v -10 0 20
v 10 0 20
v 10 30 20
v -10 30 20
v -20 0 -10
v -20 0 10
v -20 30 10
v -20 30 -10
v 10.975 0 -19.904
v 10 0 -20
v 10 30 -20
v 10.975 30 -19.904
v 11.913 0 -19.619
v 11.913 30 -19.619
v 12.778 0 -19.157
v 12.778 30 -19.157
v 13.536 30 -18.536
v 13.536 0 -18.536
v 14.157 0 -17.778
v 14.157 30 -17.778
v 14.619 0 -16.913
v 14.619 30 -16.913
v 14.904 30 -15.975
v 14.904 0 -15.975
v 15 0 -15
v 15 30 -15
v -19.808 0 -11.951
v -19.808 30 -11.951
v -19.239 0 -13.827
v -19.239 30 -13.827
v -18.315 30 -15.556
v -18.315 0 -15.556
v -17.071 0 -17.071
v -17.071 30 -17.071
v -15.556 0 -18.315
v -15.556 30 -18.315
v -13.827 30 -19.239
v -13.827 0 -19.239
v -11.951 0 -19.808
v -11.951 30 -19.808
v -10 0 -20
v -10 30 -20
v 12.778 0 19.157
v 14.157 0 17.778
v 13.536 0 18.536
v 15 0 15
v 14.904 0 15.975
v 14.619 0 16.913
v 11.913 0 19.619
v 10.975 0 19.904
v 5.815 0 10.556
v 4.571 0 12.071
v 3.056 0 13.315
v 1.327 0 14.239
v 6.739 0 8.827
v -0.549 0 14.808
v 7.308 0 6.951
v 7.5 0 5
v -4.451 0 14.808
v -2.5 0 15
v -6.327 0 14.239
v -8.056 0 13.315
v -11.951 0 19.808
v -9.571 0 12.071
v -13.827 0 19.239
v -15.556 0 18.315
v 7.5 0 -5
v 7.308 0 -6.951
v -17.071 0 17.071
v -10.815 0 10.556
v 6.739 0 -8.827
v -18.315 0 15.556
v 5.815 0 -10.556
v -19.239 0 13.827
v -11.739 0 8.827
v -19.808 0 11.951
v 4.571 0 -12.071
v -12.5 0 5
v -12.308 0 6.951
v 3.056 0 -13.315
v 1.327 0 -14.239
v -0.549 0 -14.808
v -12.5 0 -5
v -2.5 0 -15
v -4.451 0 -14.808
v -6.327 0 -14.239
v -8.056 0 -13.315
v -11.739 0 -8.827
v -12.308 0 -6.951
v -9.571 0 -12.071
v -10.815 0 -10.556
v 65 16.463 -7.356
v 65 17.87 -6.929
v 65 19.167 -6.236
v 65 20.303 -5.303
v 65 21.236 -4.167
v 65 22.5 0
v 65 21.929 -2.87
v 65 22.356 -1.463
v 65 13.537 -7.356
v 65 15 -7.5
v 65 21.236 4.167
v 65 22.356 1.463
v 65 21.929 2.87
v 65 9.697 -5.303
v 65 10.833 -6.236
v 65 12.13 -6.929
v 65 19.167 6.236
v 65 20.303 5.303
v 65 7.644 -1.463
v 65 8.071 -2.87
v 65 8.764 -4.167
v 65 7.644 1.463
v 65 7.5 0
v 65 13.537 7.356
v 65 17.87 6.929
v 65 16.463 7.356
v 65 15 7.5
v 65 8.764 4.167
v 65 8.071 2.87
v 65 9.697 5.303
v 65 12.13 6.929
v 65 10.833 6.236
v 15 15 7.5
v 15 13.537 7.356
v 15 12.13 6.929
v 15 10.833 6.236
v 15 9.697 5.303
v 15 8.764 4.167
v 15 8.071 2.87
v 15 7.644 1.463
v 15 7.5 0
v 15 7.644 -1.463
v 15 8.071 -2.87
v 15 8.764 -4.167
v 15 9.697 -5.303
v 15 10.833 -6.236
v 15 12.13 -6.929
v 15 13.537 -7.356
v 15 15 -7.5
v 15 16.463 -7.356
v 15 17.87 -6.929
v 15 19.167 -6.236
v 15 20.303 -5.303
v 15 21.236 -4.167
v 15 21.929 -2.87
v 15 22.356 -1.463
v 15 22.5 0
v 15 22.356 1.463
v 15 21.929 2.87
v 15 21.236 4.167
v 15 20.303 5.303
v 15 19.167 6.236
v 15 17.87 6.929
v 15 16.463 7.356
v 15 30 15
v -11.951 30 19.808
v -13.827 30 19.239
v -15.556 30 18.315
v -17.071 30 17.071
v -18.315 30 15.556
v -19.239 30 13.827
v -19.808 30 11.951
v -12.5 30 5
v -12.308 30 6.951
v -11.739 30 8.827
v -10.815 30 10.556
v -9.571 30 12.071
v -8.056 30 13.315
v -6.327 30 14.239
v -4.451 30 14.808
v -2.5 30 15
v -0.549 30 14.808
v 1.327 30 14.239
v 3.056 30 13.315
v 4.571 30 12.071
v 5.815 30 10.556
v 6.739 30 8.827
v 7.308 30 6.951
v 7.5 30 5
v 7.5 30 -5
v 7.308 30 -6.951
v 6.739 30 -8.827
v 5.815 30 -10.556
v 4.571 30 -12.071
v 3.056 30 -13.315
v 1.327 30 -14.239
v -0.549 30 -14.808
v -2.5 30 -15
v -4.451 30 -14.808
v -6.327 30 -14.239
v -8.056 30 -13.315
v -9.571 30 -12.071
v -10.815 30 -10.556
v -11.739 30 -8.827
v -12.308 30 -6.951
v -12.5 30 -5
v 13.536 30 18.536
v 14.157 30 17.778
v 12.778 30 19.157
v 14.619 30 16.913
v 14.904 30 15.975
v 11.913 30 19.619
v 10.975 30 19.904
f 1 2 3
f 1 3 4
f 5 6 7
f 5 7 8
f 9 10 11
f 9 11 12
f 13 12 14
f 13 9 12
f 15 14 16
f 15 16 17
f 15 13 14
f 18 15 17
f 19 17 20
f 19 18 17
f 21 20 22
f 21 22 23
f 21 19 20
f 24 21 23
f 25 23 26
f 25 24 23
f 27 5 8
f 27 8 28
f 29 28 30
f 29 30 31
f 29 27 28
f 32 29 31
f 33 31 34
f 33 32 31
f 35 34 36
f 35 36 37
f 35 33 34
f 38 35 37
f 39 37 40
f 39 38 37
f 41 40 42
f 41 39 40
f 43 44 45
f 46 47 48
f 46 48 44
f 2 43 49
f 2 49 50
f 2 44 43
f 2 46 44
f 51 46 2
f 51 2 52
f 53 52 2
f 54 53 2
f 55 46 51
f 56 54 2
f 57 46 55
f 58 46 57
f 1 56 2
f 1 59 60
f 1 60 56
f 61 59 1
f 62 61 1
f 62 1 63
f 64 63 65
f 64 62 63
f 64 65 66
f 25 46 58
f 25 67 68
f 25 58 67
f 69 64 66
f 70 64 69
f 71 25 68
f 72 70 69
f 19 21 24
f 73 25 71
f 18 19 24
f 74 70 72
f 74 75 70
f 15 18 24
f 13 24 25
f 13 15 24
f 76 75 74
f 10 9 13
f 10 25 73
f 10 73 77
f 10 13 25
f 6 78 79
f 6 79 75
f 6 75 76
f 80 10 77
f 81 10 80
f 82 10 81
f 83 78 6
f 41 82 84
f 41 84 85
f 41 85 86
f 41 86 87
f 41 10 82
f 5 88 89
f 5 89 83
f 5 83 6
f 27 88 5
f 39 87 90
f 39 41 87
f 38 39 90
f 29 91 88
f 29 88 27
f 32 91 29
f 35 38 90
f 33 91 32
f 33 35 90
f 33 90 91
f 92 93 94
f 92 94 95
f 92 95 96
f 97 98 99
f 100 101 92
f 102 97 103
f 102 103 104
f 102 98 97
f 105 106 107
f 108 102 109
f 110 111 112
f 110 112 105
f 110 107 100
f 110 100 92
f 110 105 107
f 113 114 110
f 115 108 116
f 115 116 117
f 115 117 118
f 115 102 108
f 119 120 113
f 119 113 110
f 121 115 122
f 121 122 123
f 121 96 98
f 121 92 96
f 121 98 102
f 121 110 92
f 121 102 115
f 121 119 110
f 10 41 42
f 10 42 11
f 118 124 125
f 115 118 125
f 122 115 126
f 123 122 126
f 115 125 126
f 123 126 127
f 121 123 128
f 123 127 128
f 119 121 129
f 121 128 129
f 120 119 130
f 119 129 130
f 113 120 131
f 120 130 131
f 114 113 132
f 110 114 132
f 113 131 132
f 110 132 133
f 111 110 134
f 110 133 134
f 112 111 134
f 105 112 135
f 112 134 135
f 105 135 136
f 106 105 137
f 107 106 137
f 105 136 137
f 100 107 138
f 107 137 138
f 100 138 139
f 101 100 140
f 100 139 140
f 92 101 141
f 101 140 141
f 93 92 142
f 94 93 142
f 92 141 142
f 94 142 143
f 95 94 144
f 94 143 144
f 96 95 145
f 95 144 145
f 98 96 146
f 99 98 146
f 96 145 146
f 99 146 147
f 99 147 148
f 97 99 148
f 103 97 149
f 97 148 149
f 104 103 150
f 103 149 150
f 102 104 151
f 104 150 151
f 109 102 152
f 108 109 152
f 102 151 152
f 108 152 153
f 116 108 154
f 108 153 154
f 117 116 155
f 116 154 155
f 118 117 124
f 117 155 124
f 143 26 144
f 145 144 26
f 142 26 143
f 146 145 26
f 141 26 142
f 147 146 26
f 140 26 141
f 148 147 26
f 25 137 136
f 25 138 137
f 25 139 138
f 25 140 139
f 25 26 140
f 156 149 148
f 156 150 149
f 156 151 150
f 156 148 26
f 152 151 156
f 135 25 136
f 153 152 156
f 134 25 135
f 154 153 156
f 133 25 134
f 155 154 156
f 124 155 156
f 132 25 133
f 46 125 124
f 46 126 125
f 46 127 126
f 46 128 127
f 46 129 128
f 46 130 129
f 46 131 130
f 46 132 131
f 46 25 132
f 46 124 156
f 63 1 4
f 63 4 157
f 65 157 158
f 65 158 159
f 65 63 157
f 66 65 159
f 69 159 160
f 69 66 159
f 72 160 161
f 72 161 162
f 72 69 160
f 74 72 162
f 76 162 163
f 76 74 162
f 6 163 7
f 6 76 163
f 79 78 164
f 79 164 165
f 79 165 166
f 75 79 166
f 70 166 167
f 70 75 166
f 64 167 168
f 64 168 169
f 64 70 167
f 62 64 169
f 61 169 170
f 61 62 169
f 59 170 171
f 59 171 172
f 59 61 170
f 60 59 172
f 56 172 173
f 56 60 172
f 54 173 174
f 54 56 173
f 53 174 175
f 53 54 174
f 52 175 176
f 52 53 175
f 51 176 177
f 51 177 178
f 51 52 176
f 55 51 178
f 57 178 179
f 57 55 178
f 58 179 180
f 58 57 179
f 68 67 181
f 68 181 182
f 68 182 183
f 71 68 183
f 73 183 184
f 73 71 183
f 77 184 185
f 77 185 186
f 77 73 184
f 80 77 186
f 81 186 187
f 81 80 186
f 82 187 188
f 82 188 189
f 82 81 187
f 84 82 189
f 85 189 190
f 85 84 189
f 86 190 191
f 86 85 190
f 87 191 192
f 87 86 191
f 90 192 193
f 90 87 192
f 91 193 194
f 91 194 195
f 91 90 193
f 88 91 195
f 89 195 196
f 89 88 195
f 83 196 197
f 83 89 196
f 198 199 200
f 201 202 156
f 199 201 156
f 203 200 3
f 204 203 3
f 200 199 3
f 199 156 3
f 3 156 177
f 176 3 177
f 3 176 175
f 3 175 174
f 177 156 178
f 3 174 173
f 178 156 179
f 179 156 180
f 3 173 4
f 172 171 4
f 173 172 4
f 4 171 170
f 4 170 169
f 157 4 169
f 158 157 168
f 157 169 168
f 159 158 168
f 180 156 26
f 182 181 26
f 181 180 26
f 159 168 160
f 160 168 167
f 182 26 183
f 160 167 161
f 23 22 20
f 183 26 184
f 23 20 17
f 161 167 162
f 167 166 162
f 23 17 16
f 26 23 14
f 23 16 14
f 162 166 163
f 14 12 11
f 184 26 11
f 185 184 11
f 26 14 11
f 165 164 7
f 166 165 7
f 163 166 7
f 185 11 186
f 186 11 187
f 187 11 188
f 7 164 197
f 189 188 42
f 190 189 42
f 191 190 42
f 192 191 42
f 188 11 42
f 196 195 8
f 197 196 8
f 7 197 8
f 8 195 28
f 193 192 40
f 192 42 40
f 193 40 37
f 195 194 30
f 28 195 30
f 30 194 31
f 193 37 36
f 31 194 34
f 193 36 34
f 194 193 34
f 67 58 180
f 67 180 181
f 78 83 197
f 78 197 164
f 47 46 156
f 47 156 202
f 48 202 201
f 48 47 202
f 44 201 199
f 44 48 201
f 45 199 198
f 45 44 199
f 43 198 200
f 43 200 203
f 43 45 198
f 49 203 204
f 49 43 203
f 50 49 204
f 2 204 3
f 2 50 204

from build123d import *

# Parameters (mm, degrees)
BOSS_EXTRUDE1_DEPTH = 30
SKETCH2_R           = 7.5
BOSS_EXTRUDE2_DEPTH = 50


with BuildPart() as part:
    # Sketch1 → Boss-Extrude1 (new body)
    with BuildSketch(Plane(origin=(0, 0, 0), x_dir=(1, 0, 0), z_dir=(0, 1, 0))):
        with BuildLine():
            Line((-10, 20), (10, 20))
            ThreePointArc((10, 20), (13.535533906, 18.535533906), (15, 15))
            Line((15, 15), (15, -15))
            ThreePointArc((15, -15), (13.535533906, -18.535533906), (10, -20))
            Line((10, -20), (-10, -20))
            ThreePointArc((-10, -20), (-17.071067812, -17.071067812), (-20, -10))
            Line((-20, -10), (-20, 10))
            ThreePointArc((-20, 10), (-17.071067812, 17.071067812), (-10, 20))
        make_face()
        with BuildLine():
            Line((-12.5, 5), (-12.5, -5))
            ThreePointArc((-12.5, -5), (-2.5, -15), (7.5, -5))
            Line((7.5, -5), (7.5, 5))
            ThreePointArc((7.5, 5), (-2.5, 15), (-12.5, 5))
        make_face(mode=Mode.SUBTRACT)
    extrude(amount=BOSS_EXTRUDE1_DEPTH)

    # Sketch2 → Boss-Extrude2 (add)
    with BuildSketch(Plane(origin=(15, 0, 0), x_dir=(0, 0, -1), z_dir=(1, 0, 0))):
        with Locations(Location((0, 15, 0), (0, 0, 180))):
            Circle(SKETCH2_R)
    extrude(amount=BOSS_EXTRUDE2_DEPTH)


solid = part.part
